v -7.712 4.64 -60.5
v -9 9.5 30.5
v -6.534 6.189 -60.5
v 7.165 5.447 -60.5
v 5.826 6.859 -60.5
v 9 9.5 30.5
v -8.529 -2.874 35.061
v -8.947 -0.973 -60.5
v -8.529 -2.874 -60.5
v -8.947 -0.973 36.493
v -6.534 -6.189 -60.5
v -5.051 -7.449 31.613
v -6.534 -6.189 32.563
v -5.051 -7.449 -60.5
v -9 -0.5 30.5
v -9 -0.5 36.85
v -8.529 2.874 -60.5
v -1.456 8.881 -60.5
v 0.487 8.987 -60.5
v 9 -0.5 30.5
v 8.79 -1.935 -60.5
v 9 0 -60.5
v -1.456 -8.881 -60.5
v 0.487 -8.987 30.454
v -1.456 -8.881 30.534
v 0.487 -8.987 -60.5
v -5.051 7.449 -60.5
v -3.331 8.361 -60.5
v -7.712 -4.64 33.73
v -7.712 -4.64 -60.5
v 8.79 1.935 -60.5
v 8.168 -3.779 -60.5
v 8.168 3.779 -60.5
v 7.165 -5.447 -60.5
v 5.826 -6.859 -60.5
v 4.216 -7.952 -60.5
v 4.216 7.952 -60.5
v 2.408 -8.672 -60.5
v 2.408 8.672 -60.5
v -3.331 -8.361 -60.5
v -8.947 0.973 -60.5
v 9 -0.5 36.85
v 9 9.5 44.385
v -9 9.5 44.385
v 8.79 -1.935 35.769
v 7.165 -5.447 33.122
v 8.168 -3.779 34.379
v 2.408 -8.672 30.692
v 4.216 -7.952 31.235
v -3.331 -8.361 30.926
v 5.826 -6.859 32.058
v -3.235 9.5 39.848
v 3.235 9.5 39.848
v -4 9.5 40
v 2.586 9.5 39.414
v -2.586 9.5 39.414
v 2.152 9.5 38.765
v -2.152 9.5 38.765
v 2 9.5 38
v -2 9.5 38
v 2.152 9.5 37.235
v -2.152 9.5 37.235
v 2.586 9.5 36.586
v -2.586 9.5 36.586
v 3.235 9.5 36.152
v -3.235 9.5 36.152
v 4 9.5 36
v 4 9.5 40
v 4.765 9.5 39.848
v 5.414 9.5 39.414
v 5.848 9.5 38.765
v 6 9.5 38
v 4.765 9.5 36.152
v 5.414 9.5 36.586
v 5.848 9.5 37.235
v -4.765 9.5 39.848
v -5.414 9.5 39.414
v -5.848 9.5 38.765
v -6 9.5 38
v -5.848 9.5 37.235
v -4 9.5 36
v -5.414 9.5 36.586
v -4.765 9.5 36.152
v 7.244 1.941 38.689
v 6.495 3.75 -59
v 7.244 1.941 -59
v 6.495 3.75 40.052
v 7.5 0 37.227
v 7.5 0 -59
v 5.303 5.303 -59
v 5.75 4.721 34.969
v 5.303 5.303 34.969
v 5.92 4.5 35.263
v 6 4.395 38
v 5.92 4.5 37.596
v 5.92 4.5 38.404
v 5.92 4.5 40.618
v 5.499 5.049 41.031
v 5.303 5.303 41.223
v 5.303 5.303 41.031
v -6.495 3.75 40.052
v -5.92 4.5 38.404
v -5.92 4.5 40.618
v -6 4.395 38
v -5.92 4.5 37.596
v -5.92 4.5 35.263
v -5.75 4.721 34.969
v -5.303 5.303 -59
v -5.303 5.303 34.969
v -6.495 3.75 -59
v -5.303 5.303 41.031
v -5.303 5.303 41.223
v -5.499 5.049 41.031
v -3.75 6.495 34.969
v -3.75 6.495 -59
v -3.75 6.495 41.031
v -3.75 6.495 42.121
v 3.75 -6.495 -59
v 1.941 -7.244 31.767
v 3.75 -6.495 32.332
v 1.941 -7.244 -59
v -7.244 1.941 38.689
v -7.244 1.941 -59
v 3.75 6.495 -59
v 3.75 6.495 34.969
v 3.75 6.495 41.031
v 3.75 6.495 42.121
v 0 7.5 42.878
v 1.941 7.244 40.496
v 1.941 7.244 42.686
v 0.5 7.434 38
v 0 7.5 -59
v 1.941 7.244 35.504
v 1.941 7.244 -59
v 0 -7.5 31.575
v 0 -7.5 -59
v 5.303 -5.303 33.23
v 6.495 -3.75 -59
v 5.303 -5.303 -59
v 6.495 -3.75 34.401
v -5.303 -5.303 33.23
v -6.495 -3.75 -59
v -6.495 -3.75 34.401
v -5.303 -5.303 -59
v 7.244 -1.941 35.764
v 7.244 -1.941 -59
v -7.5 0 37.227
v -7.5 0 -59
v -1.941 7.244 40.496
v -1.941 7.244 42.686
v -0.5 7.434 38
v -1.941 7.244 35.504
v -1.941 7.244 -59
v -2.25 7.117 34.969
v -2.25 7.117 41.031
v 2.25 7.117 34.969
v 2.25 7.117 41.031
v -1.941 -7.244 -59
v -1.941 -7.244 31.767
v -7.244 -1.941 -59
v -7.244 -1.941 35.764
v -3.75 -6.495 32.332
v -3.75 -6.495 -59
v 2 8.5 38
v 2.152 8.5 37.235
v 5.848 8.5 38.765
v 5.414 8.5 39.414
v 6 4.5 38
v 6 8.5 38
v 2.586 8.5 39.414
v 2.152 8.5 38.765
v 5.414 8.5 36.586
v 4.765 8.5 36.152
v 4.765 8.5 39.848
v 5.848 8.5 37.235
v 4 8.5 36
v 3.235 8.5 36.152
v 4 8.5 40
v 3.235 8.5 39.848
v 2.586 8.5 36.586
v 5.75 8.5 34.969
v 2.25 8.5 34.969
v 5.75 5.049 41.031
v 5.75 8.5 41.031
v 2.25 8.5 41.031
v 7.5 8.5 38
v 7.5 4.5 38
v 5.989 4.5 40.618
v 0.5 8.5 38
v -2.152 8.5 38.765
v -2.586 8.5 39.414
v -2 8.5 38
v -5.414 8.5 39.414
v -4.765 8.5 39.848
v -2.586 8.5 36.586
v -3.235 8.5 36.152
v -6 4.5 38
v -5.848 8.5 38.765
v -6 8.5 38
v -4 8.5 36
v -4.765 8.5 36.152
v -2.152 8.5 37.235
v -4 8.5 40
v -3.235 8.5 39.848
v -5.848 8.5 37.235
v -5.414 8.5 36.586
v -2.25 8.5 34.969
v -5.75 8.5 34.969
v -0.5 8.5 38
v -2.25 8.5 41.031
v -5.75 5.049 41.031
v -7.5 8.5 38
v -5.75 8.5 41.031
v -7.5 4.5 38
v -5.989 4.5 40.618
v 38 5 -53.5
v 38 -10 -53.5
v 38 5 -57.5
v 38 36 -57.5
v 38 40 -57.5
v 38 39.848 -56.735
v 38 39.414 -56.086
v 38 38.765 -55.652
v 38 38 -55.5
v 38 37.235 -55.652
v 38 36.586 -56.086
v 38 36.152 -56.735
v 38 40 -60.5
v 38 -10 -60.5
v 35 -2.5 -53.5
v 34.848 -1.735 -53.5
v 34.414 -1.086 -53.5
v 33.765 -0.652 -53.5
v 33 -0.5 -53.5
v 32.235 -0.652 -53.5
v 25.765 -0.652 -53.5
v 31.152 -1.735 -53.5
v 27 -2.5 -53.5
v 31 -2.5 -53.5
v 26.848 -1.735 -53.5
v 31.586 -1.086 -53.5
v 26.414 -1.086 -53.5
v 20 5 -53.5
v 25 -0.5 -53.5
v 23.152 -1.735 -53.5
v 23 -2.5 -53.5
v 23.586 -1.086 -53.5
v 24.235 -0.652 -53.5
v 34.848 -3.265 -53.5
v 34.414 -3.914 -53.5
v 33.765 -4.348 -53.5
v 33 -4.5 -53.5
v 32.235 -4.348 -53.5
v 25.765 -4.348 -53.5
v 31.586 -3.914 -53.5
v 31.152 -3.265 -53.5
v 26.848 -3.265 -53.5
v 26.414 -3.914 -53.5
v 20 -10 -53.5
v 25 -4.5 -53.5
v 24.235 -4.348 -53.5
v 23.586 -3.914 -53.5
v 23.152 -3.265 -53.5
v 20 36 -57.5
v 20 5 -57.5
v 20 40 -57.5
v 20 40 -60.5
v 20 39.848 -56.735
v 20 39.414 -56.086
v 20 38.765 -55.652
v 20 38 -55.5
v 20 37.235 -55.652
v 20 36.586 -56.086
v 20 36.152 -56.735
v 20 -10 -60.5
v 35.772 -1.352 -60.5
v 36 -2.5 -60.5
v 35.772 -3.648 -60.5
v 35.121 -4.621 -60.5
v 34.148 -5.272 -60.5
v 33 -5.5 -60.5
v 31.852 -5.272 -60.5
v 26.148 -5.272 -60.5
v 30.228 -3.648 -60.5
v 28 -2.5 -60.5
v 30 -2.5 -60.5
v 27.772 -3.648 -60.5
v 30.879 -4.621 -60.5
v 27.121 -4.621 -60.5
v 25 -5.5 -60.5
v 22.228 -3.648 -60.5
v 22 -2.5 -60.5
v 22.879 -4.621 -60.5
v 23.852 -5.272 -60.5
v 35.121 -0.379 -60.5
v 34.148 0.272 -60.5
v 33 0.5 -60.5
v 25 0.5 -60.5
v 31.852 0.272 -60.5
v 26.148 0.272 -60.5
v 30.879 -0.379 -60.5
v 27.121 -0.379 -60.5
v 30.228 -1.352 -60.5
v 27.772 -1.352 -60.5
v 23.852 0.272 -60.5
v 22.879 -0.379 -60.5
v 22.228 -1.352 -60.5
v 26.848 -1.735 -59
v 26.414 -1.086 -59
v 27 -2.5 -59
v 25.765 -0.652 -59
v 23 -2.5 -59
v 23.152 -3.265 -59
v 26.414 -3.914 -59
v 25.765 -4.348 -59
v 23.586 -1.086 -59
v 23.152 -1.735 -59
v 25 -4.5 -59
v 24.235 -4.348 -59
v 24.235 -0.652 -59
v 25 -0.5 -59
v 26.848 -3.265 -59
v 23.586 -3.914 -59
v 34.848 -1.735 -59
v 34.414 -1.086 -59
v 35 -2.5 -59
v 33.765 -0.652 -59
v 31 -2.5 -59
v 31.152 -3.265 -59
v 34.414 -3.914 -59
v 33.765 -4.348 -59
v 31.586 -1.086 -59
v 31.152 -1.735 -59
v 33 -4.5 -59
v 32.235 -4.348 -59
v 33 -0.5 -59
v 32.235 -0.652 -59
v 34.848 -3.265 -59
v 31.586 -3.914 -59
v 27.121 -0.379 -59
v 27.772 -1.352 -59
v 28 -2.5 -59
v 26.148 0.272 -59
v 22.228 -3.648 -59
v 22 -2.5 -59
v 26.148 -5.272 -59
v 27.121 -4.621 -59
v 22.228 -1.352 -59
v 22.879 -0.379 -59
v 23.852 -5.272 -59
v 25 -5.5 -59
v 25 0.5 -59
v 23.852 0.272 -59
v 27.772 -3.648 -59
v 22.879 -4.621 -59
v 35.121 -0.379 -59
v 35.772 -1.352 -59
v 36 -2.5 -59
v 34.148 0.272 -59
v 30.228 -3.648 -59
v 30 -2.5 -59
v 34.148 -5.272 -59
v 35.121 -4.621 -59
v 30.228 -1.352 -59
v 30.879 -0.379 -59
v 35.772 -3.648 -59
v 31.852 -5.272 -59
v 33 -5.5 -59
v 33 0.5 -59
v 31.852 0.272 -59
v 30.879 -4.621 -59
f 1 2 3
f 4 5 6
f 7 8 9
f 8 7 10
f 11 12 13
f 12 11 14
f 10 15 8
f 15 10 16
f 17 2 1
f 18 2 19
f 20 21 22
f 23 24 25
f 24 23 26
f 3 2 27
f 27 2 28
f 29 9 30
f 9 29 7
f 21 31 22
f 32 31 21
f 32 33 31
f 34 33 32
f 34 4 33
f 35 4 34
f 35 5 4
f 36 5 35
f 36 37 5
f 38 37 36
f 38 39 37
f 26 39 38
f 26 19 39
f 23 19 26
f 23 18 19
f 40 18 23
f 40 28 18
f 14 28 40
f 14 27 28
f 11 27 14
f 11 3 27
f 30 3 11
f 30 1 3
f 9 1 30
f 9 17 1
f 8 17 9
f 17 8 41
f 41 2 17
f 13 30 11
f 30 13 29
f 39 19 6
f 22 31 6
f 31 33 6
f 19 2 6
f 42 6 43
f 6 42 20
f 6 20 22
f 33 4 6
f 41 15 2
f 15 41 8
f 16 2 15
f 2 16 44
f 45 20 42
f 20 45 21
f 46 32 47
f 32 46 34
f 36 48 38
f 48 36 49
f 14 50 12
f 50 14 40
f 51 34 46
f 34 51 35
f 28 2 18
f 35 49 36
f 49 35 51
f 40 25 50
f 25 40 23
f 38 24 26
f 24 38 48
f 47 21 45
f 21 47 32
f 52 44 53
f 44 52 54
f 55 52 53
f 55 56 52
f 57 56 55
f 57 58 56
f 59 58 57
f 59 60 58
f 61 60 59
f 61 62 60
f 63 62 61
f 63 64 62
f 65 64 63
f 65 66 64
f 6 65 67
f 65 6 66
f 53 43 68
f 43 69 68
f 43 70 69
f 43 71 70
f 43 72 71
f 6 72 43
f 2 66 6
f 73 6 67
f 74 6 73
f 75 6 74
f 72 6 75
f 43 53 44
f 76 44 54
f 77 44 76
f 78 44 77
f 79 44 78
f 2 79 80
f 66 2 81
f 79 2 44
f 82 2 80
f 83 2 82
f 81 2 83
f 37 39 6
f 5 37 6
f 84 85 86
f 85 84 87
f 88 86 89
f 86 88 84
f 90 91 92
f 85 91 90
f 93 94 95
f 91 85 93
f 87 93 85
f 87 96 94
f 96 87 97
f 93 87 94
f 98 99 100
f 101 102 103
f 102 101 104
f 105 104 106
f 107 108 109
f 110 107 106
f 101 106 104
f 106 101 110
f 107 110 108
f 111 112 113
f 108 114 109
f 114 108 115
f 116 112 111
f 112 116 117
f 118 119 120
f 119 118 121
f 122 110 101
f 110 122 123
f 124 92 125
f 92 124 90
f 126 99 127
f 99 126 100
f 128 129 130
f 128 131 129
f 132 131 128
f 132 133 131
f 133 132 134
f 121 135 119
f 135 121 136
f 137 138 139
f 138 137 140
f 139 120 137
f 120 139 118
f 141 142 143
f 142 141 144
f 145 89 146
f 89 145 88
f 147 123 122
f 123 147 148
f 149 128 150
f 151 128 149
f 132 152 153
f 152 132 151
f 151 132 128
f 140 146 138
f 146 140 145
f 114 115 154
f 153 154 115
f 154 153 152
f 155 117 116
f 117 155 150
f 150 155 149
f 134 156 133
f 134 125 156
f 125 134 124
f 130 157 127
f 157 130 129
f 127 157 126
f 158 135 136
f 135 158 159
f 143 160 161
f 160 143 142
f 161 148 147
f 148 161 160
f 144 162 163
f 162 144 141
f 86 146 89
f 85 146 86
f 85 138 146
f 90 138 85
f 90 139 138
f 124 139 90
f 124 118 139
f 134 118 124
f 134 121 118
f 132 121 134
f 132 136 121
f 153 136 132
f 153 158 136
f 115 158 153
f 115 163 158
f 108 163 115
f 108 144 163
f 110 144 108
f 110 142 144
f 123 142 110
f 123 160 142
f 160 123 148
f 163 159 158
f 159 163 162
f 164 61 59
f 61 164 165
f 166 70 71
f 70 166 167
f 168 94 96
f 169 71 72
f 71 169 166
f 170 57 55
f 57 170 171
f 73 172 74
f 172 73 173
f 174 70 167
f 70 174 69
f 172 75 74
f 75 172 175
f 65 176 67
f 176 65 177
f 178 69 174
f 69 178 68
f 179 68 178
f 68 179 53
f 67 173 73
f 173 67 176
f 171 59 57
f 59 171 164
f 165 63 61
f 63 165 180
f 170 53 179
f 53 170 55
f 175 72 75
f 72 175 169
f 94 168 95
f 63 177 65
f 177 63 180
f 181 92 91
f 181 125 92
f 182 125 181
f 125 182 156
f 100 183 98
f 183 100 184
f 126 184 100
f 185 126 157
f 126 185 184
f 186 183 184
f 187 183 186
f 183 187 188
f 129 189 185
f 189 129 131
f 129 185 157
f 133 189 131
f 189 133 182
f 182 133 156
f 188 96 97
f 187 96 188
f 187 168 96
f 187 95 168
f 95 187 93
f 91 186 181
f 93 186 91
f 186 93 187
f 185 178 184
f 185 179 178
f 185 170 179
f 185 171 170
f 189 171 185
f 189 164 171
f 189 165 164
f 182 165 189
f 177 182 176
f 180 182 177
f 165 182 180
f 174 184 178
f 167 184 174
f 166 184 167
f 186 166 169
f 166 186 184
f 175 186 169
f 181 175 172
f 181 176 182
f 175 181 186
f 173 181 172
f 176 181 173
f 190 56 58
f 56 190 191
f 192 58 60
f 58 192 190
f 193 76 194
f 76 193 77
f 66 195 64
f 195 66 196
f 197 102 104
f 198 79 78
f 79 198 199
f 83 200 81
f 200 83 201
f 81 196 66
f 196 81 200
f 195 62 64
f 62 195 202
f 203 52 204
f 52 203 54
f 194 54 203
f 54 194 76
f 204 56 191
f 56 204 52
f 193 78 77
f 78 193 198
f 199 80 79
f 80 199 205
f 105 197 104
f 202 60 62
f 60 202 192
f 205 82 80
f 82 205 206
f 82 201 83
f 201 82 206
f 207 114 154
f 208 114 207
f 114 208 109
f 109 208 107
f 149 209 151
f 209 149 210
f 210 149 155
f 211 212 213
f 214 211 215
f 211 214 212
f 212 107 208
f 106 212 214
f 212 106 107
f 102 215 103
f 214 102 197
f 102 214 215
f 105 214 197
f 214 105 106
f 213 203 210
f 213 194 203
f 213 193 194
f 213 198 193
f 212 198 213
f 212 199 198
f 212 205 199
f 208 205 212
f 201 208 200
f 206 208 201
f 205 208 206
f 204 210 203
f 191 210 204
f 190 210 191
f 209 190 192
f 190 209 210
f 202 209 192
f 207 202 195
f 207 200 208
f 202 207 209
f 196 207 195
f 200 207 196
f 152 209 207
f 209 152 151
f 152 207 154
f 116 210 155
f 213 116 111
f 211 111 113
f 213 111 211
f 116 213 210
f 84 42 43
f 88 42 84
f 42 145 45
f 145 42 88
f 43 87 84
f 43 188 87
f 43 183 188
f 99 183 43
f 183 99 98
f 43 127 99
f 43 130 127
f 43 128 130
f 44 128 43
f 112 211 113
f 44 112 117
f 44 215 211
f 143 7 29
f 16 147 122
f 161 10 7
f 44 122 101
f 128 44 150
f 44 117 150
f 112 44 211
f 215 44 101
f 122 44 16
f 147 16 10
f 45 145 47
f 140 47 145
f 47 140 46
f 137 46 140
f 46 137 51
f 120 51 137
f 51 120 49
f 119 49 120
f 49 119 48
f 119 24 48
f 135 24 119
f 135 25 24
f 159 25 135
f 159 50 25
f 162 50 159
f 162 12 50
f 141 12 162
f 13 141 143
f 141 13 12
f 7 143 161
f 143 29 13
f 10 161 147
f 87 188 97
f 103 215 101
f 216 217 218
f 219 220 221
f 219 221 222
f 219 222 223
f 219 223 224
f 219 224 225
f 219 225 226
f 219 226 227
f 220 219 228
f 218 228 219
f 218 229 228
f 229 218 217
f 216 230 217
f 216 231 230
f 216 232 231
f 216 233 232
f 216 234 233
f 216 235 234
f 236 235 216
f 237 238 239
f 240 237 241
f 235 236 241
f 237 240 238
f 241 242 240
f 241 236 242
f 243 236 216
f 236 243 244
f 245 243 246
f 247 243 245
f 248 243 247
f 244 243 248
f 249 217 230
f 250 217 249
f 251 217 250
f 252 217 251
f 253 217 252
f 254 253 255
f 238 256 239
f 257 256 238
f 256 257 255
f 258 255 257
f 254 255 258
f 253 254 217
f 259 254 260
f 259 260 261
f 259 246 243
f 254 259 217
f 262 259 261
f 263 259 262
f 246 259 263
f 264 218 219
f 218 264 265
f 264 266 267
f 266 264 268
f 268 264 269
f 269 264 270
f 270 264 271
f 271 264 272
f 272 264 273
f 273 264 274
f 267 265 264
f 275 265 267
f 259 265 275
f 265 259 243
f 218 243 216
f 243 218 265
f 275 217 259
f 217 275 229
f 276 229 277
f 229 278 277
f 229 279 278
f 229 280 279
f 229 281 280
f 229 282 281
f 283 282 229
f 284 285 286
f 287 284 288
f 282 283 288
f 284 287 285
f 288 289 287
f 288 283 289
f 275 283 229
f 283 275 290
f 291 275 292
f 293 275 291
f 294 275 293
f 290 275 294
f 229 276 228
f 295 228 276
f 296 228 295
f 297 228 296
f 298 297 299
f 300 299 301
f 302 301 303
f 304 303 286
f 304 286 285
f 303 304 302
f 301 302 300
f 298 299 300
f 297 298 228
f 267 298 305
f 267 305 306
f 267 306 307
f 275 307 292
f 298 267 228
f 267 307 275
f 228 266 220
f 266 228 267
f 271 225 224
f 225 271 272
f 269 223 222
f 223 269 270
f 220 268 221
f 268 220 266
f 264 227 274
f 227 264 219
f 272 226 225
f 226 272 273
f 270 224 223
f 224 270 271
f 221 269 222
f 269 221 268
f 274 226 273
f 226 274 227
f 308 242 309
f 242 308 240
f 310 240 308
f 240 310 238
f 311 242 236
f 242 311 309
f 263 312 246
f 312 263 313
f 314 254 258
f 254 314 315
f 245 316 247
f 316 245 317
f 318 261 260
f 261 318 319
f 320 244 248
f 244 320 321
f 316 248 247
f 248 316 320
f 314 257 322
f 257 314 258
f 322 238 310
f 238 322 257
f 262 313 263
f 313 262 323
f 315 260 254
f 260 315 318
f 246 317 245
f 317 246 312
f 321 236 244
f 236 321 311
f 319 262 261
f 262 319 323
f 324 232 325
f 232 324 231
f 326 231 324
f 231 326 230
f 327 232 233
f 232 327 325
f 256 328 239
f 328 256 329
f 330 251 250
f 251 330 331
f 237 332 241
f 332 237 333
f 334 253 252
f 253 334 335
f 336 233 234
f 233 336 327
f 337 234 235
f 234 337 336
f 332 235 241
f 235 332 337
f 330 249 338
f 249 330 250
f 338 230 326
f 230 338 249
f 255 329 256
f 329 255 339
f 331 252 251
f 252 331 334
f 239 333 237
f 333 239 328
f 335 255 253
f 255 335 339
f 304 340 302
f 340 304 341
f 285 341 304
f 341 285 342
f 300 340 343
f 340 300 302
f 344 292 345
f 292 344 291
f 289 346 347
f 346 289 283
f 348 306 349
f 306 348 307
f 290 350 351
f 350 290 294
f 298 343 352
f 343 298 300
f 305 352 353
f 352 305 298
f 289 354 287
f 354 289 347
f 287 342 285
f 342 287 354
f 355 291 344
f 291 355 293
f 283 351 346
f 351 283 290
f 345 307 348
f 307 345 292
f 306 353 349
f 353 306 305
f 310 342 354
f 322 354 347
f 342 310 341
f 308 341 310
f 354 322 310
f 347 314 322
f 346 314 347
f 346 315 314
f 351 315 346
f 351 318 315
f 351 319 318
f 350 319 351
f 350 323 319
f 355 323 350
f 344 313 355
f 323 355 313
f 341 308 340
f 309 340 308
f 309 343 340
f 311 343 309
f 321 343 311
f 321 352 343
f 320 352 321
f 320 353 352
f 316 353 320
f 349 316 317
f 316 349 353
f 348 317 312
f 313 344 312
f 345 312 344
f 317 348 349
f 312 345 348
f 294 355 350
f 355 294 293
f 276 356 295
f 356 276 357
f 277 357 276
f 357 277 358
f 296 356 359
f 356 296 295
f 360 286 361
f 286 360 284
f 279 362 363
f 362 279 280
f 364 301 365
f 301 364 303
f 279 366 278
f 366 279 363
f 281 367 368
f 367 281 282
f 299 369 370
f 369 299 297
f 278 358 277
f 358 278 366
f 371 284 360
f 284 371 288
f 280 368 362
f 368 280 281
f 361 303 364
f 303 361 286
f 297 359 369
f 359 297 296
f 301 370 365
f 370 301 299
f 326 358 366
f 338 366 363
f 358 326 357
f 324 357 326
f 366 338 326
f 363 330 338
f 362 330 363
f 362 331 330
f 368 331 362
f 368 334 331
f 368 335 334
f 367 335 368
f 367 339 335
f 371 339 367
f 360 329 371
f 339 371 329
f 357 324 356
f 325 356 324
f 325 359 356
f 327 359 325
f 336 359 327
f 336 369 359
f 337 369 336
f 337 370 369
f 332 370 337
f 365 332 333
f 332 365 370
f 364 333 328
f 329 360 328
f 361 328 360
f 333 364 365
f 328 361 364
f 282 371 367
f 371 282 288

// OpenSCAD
//Length of the clip
clip_length = 50;
//inner length of sheath, length of accu from knob downwards
inner_length = 90;
//inner Diameter, Diameter of accu + some tolerance
inner_dia = 15;
// which part should be rendered?
part = "plate"; //[assy:Assembly,sheath:Sheath only,clip:Clip only,plate:Both parts for printing]

module print_part()
{
if(part=="assy"){
assembly();
}else if(part=="sheath"){
sheath();
}else if(part=="clip"){
clip();
}else if(part=="plate"){
plate();
}
}
module sheath()
{
difference()
{
hull()
{
translate([0,0,-inner_length/2+37.5])
cylinder(r=inner_dia/2+1.5,h=inner_length+16,center=true);
translate([0,inner_dia/2-3,38])
cube([inner_dia+3,10,15],center=true);
}
translate([0,0,-inner_length/2+46.5])
cylinder(r=inner_dia/2,h=inner_length+31,center=true);

translate([4,inner_dia/2,38])
rotate([90,0,0])
cylinder(r=2,h=7,center=true,$fn=16);

translate([4,inner_dia/2-1,38])
rotate([90,0,0])
cylinder(r=3.5,h=4,center=true,$fn=6);

translate([-4,inner_dia/2,38])
rotate([90,0,0])
cylinder(r=2,h=7,center=true,$fn=16);

translate([-4,inner_dia/2-1,38])
rotate([90,0,0])
cylinder(r=3.5,h=4,center=true,$fn=6);

translate([0,0,51])
rotate([37,0,0])
cube([inner_dia*2,inner_dia*3,22],center=true);
}
}

module clip()
{
difference()
{
union()
{
cube([18,15,4],center=false);
translate([0,0,-3])
cube([18,clip_length,3],center=false);
translate([0,clip_length-2,0])
rotate([0,90,0])
cylinder(r=2,h=18,$fn=16);
}
translate([5,7.5,0])
cylinder(r=2,h=15,center=true,$fn=16);
translate([13,7.5,0])
cylinder(r=2,h=15,center=true,$fn=16);

translate([5,7.5,-2.5])
cylinder(r=3,h=2,center=true,$fn=16);
translate([13,7.5,-2.5])
cylinder(r=3,h=2,center=true,$fn=16);
}
}
module plate()
{
sheath();
translate([20,-10,-inner_length+32.5])
clip();
}
module assembly()
{
sheath();
translate([9,17,45.5])
rotate([90,180,0])
clip();
}

print_part();
